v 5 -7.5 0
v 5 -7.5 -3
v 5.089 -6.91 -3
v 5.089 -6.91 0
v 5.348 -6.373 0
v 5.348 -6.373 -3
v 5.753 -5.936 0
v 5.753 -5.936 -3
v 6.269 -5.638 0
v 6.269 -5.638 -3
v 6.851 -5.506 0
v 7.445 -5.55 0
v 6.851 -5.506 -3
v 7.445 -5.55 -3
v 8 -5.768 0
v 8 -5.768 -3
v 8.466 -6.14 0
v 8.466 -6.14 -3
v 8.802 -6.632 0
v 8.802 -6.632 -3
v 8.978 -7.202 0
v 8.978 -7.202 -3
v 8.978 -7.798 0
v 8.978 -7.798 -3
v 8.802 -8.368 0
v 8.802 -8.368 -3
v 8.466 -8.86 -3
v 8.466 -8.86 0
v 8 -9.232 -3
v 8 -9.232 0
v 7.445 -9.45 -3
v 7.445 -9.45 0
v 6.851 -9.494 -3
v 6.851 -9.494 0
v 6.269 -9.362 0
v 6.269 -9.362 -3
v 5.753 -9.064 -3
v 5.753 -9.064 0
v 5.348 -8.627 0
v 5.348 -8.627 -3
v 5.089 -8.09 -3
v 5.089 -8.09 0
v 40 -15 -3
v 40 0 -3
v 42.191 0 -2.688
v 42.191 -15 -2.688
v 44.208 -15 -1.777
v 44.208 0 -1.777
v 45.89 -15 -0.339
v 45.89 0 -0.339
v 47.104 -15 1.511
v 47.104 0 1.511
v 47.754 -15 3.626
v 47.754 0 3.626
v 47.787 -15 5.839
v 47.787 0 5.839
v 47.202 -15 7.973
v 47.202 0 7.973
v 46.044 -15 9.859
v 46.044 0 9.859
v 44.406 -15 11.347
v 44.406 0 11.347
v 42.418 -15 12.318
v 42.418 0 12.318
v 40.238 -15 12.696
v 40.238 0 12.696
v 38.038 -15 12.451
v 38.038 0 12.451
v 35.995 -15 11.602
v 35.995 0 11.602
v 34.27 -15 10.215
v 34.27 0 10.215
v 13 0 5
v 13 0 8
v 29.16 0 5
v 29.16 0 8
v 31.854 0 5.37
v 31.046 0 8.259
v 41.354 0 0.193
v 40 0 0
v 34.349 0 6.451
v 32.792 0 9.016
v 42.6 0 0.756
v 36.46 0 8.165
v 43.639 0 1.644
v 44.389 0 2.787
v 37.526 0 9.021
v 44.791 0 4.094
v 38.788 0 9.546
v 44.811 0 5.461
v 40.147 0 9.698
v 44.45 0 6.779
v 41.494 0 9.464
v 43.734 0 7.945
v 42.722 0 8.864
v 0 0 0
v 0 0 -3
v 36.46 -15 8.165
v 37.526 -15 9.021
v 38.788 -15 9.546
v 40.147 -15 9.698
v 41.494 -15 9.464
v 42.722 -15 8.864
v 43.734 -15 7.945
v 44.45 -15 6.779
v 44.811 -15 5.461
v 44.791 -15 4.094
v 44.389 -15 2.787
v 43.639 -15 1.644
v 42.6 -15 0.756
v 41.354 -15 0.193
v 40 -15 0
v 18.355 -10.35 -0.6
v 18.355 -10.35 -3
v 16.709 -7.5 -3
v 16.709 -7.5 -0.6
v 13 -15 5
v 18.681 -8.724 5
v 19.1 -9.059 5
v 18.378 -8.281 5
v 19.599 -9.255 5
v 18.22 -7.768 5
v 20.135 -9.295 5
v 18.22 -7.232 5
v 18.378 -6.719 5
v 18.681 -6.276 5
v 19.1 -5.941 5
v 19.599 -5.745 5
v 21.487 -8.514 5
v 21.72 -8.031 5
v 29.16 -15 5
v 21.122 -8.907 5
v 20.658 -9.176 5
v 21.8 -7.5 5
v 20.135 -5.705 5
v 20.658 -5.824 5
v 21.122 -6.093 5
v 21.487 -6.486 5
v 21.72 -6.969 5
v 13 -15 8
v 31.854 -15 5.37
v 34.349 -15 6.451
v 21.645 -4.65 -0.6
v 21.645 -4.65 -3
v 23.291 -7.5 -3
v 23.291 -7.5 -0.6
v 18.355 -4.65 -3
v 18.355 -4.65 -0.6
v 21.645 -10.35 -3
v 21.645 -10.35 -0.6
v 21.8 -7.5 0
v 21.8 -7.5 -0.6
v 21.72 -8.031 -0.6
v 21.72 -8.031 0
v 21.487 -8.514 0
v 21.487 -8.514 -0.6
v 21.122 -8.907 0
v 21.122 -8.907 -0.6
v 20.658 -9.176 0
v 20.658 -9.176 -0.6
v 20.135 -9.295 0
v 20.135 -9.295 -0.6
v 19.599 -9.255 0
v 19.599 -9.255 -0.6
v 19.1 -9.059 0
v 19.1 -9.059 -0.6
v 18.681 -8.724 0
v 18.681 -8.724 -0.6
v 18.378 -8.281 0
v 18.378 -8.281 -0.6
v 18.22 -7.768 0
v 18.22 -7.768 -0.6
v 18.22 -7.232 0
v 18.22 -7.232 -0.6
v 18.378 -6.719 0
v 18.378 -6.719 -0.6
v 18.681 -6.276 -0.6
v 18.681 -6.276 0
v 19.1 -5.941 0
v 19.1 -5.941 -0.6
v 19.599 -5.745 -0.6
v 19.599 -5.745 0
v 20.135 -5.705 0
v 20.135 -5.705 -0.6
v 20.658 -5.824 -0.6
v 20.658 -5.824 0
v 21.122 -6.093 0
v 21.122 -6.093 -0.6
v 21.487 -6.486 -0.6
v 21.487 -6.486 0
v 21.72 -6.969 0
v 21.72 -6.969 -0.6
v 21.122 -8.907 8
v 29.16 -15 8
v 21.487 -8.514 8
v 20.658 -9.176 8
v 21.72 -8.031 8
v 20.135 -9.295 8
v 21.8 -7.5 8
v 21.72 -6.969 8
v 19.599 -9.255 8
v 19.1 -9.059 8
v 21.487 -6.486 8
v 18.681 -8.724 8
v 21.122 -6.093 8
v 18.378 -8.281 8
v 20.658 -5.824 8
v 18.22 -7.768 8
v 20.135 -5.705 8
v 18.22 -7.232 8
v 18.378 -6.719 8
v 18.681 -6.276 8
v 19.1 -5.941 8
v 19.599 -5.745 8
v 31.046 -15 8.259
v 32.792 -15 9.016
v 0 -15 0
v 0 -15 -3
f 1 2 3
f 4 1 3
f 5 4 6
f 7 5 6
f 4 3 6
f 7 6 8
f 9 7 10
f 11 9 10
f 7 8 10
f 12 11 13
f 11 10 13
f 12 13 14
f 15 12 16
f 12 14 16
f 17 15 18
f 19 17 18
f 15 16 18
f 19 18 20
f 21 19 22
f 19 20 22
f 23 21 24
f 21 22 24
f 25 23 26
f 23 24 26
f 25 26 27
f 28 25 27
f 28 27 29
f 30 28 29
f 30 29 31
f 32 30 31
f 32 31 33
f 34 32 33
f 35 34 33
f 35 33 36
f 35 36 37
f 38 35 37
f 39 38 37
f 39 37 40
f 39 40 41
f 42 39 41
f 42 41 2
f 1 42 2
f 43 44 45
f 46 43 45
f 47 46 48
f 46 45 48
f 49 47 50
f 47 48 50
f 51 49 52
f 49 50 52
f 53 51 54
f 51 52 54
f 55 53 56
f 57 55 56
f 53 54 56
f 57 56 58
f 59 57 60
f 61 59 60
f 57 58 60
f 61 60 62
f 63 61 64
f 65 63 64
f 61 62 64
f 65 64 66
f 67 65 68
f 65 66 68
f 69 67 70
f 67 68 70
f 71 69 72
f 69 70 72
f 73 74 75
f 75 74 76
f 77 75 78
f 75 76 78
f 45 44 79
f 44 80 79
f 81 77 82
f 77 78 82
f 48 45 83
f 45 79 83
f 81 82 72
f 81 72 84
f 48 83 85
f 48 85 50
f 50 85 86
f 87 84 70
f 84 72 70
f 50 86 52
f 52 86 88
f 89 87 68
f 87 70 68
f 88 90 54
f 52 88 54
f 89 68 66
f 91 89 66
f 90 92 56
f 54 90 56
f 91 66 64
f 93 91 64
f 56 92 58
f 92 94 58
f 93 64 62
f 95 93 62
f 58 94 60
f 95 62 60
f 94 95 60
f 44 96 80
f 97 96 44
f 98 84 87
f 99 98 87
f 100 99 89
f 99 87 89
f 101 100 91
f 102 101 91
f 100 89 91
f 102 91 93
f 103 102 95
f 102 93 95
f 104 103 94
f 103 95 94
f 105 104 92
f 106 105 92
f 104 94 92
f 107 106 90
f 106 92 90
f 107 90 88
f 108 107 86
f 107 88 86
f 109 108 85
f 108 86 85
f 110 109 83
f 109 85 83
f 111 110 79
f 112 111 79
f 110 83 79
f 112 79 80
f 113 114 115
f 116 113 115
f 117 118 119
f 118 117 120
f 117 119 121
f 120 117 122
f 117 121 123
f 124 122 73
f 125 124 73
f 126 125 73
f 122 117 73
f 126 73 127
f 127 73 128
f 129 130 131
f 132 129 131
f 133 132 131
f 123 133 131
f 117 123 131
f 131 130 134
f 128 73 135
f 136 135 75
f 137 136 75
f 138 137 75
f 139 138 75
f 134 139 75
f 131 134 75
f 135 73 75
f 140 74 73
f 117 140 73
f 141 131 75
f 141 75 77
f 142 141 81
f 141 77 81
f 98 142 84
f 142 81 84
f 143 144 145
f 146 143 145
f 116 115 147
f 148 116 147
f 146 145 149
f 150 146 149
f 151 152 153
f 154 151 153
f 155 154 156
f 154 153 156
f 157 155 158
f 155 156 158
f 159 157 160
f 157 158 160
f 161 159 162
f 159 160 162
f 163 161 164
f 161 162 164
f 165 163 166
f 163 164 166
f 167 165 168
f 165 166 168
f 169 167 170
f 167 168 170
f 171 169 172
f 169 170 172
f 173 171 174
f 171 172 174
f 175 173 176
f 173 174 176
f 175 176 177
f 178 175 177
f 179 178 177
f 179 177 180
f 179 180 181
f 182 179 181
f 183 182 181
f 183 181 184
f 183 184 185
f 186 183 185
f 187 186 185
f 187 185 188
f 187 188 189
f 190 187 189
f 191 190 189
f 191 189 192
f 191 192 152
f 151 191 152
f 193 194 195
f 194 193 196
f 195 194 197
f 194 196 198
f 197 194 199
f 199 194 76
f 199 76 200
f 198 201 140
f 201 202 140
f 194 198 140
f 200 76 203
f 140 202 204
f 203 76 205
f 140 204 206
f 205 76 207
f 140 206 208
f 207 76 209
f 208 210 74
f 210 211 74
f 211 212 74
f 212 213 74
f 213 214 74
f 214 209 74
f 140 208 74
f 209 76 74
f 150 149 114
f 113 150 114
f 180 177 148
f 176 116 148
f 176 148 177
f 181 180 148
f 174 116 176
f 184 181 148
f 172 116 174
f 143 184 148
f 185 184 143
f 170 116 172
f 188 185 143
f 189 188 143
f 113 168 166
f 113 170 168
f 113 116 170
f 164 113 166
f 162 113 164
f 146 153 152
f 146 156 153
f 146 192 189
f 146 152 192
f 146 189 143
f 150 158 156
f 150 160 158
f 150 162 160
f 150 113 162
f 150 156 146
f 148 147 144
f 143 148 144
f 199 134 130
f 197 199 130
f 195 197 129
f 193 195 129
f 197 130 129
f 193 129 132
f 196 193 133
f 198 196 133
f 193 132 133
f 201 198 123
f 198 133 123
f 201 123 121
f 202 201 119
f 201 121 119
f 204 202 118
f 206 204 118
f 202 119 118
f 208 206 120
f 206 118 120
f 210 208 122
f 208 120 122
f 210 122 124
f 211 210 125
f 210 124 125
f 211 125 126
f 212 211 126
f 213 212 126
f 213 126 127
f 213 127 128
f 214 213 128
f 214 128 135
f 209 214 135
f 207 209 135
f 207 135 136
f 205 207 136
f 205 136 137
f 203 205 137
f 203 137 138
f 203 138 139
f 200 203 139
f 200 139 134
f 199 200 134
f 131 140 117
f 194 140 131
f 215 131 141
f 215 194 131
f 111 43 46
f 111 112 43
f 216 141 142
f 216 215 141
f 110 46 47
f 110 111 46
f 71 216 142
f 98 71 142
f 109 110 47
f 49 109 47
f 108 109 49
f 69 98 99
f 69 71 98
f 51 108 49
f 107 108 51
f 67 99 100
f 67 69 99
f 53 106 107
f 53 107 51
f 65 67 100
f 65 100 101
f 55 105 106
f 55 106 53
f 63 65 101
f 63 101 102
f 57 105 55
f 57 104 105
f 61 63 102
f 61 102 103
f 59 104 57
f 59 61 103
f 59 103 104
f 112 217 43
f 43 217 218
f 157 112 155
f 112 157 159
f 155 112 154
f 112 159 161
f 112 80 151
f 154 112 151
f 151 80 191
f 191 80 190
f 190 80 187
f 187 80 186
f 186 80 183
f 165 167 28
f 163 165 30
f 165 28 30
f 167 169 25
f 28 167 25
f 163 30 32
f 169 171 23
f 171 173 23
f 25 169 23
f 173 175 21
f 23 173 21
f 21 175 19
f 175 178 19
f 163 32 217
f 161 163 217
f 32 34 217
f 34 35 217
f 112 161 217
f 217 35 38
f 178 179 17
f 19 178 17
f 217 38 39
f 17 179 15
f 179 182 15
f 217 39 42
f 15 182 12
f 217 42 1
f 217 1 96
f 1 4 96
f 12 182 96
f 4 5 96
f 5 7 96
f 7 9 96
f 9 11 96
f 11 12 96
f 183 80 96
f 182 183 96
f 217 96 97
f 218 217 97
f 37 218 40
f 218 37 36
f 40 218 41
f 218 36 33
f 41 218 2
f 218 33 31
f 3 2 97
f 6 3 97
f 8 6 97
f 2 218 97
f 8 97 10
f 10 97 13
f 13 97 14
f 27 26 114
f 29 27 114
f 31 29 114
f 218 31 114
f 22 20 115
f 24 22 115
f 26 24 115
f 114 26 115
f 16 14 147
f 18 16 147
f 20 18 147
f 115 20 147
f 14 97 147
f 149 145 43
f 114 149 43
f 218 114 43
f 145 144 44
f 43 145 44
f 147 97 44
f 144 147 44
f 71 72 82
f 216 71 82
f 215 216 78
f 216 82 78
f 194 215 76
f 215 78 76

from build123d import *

# Parameters (mm, degrees)
F1_DEPTH = 15
F3_DEPTH = 2.4
F4_R     = 1.8
F5_DEPTH = 13.301
F7_D     = 4


with BuildPart() as f1:
    # F0 (on Front) → F1 (new body)
    with BuildSketch(Plane.XZ):
        with BuildLine():
            Line((40, 0), (0, 0))
            Line((0, 0), (0, -3))
            Line((0, -3), (40, -3))
            ThreePointArc((40, -3), (47.202138, 7.972773), (34.269901, 10.215488))
            ThreePointArc((34.269901, 10.215488), (31.944896, 8.577711), (29.160258, 8))
            Line((29.160258, 8), (13, 8))
            Line((13, 8), (13, 5))
            Line((13, 5), (29.160258, 5))
            ThreePointArc((29.160258, 5), (33.138313, 5.825302), (36.459748, 8.164983))
            ThreePointArc((36.459748, 8.164983), (44.449729, 6.779356), (40, 0))
        make_face()
    extrude(amount=F1_DEPTH)

    # F2 (on face) → F3 (cut)
    with BuildSketch(Plane(origin=(0, 0, -3), x_dir=(1, 0, 0), z_dir=(0, 0, -1))):
        Polygon((21.645448, 10.35), (18.354552, 10.35), (16.709103, 7.5), (18.354552, 4.65), (21.645448, 4.65), (23.290897, 7.5), align=None)
    extrude(amount=-F3_DEPTH, mode=Mode.SUBTRACT)

    # F4 (on face) → F5 (cut, through all)
    with BuildSketch(Plane(origin=(0, 0, -0.6), x_dir=(1, 0, 0), z_dir=(0, 0, -1))):
        with Locations((20, 7.5)):
            Circle(F4_R)
    extrude(amount=-F5_DEPTH, mode=Mode.SUBTRACT)

    # F7 (through all)
    with Locations(Plane.XY):
        with Locations((7, -7.5)):
            Hole(F7_D / 2)


solid = f1.part
